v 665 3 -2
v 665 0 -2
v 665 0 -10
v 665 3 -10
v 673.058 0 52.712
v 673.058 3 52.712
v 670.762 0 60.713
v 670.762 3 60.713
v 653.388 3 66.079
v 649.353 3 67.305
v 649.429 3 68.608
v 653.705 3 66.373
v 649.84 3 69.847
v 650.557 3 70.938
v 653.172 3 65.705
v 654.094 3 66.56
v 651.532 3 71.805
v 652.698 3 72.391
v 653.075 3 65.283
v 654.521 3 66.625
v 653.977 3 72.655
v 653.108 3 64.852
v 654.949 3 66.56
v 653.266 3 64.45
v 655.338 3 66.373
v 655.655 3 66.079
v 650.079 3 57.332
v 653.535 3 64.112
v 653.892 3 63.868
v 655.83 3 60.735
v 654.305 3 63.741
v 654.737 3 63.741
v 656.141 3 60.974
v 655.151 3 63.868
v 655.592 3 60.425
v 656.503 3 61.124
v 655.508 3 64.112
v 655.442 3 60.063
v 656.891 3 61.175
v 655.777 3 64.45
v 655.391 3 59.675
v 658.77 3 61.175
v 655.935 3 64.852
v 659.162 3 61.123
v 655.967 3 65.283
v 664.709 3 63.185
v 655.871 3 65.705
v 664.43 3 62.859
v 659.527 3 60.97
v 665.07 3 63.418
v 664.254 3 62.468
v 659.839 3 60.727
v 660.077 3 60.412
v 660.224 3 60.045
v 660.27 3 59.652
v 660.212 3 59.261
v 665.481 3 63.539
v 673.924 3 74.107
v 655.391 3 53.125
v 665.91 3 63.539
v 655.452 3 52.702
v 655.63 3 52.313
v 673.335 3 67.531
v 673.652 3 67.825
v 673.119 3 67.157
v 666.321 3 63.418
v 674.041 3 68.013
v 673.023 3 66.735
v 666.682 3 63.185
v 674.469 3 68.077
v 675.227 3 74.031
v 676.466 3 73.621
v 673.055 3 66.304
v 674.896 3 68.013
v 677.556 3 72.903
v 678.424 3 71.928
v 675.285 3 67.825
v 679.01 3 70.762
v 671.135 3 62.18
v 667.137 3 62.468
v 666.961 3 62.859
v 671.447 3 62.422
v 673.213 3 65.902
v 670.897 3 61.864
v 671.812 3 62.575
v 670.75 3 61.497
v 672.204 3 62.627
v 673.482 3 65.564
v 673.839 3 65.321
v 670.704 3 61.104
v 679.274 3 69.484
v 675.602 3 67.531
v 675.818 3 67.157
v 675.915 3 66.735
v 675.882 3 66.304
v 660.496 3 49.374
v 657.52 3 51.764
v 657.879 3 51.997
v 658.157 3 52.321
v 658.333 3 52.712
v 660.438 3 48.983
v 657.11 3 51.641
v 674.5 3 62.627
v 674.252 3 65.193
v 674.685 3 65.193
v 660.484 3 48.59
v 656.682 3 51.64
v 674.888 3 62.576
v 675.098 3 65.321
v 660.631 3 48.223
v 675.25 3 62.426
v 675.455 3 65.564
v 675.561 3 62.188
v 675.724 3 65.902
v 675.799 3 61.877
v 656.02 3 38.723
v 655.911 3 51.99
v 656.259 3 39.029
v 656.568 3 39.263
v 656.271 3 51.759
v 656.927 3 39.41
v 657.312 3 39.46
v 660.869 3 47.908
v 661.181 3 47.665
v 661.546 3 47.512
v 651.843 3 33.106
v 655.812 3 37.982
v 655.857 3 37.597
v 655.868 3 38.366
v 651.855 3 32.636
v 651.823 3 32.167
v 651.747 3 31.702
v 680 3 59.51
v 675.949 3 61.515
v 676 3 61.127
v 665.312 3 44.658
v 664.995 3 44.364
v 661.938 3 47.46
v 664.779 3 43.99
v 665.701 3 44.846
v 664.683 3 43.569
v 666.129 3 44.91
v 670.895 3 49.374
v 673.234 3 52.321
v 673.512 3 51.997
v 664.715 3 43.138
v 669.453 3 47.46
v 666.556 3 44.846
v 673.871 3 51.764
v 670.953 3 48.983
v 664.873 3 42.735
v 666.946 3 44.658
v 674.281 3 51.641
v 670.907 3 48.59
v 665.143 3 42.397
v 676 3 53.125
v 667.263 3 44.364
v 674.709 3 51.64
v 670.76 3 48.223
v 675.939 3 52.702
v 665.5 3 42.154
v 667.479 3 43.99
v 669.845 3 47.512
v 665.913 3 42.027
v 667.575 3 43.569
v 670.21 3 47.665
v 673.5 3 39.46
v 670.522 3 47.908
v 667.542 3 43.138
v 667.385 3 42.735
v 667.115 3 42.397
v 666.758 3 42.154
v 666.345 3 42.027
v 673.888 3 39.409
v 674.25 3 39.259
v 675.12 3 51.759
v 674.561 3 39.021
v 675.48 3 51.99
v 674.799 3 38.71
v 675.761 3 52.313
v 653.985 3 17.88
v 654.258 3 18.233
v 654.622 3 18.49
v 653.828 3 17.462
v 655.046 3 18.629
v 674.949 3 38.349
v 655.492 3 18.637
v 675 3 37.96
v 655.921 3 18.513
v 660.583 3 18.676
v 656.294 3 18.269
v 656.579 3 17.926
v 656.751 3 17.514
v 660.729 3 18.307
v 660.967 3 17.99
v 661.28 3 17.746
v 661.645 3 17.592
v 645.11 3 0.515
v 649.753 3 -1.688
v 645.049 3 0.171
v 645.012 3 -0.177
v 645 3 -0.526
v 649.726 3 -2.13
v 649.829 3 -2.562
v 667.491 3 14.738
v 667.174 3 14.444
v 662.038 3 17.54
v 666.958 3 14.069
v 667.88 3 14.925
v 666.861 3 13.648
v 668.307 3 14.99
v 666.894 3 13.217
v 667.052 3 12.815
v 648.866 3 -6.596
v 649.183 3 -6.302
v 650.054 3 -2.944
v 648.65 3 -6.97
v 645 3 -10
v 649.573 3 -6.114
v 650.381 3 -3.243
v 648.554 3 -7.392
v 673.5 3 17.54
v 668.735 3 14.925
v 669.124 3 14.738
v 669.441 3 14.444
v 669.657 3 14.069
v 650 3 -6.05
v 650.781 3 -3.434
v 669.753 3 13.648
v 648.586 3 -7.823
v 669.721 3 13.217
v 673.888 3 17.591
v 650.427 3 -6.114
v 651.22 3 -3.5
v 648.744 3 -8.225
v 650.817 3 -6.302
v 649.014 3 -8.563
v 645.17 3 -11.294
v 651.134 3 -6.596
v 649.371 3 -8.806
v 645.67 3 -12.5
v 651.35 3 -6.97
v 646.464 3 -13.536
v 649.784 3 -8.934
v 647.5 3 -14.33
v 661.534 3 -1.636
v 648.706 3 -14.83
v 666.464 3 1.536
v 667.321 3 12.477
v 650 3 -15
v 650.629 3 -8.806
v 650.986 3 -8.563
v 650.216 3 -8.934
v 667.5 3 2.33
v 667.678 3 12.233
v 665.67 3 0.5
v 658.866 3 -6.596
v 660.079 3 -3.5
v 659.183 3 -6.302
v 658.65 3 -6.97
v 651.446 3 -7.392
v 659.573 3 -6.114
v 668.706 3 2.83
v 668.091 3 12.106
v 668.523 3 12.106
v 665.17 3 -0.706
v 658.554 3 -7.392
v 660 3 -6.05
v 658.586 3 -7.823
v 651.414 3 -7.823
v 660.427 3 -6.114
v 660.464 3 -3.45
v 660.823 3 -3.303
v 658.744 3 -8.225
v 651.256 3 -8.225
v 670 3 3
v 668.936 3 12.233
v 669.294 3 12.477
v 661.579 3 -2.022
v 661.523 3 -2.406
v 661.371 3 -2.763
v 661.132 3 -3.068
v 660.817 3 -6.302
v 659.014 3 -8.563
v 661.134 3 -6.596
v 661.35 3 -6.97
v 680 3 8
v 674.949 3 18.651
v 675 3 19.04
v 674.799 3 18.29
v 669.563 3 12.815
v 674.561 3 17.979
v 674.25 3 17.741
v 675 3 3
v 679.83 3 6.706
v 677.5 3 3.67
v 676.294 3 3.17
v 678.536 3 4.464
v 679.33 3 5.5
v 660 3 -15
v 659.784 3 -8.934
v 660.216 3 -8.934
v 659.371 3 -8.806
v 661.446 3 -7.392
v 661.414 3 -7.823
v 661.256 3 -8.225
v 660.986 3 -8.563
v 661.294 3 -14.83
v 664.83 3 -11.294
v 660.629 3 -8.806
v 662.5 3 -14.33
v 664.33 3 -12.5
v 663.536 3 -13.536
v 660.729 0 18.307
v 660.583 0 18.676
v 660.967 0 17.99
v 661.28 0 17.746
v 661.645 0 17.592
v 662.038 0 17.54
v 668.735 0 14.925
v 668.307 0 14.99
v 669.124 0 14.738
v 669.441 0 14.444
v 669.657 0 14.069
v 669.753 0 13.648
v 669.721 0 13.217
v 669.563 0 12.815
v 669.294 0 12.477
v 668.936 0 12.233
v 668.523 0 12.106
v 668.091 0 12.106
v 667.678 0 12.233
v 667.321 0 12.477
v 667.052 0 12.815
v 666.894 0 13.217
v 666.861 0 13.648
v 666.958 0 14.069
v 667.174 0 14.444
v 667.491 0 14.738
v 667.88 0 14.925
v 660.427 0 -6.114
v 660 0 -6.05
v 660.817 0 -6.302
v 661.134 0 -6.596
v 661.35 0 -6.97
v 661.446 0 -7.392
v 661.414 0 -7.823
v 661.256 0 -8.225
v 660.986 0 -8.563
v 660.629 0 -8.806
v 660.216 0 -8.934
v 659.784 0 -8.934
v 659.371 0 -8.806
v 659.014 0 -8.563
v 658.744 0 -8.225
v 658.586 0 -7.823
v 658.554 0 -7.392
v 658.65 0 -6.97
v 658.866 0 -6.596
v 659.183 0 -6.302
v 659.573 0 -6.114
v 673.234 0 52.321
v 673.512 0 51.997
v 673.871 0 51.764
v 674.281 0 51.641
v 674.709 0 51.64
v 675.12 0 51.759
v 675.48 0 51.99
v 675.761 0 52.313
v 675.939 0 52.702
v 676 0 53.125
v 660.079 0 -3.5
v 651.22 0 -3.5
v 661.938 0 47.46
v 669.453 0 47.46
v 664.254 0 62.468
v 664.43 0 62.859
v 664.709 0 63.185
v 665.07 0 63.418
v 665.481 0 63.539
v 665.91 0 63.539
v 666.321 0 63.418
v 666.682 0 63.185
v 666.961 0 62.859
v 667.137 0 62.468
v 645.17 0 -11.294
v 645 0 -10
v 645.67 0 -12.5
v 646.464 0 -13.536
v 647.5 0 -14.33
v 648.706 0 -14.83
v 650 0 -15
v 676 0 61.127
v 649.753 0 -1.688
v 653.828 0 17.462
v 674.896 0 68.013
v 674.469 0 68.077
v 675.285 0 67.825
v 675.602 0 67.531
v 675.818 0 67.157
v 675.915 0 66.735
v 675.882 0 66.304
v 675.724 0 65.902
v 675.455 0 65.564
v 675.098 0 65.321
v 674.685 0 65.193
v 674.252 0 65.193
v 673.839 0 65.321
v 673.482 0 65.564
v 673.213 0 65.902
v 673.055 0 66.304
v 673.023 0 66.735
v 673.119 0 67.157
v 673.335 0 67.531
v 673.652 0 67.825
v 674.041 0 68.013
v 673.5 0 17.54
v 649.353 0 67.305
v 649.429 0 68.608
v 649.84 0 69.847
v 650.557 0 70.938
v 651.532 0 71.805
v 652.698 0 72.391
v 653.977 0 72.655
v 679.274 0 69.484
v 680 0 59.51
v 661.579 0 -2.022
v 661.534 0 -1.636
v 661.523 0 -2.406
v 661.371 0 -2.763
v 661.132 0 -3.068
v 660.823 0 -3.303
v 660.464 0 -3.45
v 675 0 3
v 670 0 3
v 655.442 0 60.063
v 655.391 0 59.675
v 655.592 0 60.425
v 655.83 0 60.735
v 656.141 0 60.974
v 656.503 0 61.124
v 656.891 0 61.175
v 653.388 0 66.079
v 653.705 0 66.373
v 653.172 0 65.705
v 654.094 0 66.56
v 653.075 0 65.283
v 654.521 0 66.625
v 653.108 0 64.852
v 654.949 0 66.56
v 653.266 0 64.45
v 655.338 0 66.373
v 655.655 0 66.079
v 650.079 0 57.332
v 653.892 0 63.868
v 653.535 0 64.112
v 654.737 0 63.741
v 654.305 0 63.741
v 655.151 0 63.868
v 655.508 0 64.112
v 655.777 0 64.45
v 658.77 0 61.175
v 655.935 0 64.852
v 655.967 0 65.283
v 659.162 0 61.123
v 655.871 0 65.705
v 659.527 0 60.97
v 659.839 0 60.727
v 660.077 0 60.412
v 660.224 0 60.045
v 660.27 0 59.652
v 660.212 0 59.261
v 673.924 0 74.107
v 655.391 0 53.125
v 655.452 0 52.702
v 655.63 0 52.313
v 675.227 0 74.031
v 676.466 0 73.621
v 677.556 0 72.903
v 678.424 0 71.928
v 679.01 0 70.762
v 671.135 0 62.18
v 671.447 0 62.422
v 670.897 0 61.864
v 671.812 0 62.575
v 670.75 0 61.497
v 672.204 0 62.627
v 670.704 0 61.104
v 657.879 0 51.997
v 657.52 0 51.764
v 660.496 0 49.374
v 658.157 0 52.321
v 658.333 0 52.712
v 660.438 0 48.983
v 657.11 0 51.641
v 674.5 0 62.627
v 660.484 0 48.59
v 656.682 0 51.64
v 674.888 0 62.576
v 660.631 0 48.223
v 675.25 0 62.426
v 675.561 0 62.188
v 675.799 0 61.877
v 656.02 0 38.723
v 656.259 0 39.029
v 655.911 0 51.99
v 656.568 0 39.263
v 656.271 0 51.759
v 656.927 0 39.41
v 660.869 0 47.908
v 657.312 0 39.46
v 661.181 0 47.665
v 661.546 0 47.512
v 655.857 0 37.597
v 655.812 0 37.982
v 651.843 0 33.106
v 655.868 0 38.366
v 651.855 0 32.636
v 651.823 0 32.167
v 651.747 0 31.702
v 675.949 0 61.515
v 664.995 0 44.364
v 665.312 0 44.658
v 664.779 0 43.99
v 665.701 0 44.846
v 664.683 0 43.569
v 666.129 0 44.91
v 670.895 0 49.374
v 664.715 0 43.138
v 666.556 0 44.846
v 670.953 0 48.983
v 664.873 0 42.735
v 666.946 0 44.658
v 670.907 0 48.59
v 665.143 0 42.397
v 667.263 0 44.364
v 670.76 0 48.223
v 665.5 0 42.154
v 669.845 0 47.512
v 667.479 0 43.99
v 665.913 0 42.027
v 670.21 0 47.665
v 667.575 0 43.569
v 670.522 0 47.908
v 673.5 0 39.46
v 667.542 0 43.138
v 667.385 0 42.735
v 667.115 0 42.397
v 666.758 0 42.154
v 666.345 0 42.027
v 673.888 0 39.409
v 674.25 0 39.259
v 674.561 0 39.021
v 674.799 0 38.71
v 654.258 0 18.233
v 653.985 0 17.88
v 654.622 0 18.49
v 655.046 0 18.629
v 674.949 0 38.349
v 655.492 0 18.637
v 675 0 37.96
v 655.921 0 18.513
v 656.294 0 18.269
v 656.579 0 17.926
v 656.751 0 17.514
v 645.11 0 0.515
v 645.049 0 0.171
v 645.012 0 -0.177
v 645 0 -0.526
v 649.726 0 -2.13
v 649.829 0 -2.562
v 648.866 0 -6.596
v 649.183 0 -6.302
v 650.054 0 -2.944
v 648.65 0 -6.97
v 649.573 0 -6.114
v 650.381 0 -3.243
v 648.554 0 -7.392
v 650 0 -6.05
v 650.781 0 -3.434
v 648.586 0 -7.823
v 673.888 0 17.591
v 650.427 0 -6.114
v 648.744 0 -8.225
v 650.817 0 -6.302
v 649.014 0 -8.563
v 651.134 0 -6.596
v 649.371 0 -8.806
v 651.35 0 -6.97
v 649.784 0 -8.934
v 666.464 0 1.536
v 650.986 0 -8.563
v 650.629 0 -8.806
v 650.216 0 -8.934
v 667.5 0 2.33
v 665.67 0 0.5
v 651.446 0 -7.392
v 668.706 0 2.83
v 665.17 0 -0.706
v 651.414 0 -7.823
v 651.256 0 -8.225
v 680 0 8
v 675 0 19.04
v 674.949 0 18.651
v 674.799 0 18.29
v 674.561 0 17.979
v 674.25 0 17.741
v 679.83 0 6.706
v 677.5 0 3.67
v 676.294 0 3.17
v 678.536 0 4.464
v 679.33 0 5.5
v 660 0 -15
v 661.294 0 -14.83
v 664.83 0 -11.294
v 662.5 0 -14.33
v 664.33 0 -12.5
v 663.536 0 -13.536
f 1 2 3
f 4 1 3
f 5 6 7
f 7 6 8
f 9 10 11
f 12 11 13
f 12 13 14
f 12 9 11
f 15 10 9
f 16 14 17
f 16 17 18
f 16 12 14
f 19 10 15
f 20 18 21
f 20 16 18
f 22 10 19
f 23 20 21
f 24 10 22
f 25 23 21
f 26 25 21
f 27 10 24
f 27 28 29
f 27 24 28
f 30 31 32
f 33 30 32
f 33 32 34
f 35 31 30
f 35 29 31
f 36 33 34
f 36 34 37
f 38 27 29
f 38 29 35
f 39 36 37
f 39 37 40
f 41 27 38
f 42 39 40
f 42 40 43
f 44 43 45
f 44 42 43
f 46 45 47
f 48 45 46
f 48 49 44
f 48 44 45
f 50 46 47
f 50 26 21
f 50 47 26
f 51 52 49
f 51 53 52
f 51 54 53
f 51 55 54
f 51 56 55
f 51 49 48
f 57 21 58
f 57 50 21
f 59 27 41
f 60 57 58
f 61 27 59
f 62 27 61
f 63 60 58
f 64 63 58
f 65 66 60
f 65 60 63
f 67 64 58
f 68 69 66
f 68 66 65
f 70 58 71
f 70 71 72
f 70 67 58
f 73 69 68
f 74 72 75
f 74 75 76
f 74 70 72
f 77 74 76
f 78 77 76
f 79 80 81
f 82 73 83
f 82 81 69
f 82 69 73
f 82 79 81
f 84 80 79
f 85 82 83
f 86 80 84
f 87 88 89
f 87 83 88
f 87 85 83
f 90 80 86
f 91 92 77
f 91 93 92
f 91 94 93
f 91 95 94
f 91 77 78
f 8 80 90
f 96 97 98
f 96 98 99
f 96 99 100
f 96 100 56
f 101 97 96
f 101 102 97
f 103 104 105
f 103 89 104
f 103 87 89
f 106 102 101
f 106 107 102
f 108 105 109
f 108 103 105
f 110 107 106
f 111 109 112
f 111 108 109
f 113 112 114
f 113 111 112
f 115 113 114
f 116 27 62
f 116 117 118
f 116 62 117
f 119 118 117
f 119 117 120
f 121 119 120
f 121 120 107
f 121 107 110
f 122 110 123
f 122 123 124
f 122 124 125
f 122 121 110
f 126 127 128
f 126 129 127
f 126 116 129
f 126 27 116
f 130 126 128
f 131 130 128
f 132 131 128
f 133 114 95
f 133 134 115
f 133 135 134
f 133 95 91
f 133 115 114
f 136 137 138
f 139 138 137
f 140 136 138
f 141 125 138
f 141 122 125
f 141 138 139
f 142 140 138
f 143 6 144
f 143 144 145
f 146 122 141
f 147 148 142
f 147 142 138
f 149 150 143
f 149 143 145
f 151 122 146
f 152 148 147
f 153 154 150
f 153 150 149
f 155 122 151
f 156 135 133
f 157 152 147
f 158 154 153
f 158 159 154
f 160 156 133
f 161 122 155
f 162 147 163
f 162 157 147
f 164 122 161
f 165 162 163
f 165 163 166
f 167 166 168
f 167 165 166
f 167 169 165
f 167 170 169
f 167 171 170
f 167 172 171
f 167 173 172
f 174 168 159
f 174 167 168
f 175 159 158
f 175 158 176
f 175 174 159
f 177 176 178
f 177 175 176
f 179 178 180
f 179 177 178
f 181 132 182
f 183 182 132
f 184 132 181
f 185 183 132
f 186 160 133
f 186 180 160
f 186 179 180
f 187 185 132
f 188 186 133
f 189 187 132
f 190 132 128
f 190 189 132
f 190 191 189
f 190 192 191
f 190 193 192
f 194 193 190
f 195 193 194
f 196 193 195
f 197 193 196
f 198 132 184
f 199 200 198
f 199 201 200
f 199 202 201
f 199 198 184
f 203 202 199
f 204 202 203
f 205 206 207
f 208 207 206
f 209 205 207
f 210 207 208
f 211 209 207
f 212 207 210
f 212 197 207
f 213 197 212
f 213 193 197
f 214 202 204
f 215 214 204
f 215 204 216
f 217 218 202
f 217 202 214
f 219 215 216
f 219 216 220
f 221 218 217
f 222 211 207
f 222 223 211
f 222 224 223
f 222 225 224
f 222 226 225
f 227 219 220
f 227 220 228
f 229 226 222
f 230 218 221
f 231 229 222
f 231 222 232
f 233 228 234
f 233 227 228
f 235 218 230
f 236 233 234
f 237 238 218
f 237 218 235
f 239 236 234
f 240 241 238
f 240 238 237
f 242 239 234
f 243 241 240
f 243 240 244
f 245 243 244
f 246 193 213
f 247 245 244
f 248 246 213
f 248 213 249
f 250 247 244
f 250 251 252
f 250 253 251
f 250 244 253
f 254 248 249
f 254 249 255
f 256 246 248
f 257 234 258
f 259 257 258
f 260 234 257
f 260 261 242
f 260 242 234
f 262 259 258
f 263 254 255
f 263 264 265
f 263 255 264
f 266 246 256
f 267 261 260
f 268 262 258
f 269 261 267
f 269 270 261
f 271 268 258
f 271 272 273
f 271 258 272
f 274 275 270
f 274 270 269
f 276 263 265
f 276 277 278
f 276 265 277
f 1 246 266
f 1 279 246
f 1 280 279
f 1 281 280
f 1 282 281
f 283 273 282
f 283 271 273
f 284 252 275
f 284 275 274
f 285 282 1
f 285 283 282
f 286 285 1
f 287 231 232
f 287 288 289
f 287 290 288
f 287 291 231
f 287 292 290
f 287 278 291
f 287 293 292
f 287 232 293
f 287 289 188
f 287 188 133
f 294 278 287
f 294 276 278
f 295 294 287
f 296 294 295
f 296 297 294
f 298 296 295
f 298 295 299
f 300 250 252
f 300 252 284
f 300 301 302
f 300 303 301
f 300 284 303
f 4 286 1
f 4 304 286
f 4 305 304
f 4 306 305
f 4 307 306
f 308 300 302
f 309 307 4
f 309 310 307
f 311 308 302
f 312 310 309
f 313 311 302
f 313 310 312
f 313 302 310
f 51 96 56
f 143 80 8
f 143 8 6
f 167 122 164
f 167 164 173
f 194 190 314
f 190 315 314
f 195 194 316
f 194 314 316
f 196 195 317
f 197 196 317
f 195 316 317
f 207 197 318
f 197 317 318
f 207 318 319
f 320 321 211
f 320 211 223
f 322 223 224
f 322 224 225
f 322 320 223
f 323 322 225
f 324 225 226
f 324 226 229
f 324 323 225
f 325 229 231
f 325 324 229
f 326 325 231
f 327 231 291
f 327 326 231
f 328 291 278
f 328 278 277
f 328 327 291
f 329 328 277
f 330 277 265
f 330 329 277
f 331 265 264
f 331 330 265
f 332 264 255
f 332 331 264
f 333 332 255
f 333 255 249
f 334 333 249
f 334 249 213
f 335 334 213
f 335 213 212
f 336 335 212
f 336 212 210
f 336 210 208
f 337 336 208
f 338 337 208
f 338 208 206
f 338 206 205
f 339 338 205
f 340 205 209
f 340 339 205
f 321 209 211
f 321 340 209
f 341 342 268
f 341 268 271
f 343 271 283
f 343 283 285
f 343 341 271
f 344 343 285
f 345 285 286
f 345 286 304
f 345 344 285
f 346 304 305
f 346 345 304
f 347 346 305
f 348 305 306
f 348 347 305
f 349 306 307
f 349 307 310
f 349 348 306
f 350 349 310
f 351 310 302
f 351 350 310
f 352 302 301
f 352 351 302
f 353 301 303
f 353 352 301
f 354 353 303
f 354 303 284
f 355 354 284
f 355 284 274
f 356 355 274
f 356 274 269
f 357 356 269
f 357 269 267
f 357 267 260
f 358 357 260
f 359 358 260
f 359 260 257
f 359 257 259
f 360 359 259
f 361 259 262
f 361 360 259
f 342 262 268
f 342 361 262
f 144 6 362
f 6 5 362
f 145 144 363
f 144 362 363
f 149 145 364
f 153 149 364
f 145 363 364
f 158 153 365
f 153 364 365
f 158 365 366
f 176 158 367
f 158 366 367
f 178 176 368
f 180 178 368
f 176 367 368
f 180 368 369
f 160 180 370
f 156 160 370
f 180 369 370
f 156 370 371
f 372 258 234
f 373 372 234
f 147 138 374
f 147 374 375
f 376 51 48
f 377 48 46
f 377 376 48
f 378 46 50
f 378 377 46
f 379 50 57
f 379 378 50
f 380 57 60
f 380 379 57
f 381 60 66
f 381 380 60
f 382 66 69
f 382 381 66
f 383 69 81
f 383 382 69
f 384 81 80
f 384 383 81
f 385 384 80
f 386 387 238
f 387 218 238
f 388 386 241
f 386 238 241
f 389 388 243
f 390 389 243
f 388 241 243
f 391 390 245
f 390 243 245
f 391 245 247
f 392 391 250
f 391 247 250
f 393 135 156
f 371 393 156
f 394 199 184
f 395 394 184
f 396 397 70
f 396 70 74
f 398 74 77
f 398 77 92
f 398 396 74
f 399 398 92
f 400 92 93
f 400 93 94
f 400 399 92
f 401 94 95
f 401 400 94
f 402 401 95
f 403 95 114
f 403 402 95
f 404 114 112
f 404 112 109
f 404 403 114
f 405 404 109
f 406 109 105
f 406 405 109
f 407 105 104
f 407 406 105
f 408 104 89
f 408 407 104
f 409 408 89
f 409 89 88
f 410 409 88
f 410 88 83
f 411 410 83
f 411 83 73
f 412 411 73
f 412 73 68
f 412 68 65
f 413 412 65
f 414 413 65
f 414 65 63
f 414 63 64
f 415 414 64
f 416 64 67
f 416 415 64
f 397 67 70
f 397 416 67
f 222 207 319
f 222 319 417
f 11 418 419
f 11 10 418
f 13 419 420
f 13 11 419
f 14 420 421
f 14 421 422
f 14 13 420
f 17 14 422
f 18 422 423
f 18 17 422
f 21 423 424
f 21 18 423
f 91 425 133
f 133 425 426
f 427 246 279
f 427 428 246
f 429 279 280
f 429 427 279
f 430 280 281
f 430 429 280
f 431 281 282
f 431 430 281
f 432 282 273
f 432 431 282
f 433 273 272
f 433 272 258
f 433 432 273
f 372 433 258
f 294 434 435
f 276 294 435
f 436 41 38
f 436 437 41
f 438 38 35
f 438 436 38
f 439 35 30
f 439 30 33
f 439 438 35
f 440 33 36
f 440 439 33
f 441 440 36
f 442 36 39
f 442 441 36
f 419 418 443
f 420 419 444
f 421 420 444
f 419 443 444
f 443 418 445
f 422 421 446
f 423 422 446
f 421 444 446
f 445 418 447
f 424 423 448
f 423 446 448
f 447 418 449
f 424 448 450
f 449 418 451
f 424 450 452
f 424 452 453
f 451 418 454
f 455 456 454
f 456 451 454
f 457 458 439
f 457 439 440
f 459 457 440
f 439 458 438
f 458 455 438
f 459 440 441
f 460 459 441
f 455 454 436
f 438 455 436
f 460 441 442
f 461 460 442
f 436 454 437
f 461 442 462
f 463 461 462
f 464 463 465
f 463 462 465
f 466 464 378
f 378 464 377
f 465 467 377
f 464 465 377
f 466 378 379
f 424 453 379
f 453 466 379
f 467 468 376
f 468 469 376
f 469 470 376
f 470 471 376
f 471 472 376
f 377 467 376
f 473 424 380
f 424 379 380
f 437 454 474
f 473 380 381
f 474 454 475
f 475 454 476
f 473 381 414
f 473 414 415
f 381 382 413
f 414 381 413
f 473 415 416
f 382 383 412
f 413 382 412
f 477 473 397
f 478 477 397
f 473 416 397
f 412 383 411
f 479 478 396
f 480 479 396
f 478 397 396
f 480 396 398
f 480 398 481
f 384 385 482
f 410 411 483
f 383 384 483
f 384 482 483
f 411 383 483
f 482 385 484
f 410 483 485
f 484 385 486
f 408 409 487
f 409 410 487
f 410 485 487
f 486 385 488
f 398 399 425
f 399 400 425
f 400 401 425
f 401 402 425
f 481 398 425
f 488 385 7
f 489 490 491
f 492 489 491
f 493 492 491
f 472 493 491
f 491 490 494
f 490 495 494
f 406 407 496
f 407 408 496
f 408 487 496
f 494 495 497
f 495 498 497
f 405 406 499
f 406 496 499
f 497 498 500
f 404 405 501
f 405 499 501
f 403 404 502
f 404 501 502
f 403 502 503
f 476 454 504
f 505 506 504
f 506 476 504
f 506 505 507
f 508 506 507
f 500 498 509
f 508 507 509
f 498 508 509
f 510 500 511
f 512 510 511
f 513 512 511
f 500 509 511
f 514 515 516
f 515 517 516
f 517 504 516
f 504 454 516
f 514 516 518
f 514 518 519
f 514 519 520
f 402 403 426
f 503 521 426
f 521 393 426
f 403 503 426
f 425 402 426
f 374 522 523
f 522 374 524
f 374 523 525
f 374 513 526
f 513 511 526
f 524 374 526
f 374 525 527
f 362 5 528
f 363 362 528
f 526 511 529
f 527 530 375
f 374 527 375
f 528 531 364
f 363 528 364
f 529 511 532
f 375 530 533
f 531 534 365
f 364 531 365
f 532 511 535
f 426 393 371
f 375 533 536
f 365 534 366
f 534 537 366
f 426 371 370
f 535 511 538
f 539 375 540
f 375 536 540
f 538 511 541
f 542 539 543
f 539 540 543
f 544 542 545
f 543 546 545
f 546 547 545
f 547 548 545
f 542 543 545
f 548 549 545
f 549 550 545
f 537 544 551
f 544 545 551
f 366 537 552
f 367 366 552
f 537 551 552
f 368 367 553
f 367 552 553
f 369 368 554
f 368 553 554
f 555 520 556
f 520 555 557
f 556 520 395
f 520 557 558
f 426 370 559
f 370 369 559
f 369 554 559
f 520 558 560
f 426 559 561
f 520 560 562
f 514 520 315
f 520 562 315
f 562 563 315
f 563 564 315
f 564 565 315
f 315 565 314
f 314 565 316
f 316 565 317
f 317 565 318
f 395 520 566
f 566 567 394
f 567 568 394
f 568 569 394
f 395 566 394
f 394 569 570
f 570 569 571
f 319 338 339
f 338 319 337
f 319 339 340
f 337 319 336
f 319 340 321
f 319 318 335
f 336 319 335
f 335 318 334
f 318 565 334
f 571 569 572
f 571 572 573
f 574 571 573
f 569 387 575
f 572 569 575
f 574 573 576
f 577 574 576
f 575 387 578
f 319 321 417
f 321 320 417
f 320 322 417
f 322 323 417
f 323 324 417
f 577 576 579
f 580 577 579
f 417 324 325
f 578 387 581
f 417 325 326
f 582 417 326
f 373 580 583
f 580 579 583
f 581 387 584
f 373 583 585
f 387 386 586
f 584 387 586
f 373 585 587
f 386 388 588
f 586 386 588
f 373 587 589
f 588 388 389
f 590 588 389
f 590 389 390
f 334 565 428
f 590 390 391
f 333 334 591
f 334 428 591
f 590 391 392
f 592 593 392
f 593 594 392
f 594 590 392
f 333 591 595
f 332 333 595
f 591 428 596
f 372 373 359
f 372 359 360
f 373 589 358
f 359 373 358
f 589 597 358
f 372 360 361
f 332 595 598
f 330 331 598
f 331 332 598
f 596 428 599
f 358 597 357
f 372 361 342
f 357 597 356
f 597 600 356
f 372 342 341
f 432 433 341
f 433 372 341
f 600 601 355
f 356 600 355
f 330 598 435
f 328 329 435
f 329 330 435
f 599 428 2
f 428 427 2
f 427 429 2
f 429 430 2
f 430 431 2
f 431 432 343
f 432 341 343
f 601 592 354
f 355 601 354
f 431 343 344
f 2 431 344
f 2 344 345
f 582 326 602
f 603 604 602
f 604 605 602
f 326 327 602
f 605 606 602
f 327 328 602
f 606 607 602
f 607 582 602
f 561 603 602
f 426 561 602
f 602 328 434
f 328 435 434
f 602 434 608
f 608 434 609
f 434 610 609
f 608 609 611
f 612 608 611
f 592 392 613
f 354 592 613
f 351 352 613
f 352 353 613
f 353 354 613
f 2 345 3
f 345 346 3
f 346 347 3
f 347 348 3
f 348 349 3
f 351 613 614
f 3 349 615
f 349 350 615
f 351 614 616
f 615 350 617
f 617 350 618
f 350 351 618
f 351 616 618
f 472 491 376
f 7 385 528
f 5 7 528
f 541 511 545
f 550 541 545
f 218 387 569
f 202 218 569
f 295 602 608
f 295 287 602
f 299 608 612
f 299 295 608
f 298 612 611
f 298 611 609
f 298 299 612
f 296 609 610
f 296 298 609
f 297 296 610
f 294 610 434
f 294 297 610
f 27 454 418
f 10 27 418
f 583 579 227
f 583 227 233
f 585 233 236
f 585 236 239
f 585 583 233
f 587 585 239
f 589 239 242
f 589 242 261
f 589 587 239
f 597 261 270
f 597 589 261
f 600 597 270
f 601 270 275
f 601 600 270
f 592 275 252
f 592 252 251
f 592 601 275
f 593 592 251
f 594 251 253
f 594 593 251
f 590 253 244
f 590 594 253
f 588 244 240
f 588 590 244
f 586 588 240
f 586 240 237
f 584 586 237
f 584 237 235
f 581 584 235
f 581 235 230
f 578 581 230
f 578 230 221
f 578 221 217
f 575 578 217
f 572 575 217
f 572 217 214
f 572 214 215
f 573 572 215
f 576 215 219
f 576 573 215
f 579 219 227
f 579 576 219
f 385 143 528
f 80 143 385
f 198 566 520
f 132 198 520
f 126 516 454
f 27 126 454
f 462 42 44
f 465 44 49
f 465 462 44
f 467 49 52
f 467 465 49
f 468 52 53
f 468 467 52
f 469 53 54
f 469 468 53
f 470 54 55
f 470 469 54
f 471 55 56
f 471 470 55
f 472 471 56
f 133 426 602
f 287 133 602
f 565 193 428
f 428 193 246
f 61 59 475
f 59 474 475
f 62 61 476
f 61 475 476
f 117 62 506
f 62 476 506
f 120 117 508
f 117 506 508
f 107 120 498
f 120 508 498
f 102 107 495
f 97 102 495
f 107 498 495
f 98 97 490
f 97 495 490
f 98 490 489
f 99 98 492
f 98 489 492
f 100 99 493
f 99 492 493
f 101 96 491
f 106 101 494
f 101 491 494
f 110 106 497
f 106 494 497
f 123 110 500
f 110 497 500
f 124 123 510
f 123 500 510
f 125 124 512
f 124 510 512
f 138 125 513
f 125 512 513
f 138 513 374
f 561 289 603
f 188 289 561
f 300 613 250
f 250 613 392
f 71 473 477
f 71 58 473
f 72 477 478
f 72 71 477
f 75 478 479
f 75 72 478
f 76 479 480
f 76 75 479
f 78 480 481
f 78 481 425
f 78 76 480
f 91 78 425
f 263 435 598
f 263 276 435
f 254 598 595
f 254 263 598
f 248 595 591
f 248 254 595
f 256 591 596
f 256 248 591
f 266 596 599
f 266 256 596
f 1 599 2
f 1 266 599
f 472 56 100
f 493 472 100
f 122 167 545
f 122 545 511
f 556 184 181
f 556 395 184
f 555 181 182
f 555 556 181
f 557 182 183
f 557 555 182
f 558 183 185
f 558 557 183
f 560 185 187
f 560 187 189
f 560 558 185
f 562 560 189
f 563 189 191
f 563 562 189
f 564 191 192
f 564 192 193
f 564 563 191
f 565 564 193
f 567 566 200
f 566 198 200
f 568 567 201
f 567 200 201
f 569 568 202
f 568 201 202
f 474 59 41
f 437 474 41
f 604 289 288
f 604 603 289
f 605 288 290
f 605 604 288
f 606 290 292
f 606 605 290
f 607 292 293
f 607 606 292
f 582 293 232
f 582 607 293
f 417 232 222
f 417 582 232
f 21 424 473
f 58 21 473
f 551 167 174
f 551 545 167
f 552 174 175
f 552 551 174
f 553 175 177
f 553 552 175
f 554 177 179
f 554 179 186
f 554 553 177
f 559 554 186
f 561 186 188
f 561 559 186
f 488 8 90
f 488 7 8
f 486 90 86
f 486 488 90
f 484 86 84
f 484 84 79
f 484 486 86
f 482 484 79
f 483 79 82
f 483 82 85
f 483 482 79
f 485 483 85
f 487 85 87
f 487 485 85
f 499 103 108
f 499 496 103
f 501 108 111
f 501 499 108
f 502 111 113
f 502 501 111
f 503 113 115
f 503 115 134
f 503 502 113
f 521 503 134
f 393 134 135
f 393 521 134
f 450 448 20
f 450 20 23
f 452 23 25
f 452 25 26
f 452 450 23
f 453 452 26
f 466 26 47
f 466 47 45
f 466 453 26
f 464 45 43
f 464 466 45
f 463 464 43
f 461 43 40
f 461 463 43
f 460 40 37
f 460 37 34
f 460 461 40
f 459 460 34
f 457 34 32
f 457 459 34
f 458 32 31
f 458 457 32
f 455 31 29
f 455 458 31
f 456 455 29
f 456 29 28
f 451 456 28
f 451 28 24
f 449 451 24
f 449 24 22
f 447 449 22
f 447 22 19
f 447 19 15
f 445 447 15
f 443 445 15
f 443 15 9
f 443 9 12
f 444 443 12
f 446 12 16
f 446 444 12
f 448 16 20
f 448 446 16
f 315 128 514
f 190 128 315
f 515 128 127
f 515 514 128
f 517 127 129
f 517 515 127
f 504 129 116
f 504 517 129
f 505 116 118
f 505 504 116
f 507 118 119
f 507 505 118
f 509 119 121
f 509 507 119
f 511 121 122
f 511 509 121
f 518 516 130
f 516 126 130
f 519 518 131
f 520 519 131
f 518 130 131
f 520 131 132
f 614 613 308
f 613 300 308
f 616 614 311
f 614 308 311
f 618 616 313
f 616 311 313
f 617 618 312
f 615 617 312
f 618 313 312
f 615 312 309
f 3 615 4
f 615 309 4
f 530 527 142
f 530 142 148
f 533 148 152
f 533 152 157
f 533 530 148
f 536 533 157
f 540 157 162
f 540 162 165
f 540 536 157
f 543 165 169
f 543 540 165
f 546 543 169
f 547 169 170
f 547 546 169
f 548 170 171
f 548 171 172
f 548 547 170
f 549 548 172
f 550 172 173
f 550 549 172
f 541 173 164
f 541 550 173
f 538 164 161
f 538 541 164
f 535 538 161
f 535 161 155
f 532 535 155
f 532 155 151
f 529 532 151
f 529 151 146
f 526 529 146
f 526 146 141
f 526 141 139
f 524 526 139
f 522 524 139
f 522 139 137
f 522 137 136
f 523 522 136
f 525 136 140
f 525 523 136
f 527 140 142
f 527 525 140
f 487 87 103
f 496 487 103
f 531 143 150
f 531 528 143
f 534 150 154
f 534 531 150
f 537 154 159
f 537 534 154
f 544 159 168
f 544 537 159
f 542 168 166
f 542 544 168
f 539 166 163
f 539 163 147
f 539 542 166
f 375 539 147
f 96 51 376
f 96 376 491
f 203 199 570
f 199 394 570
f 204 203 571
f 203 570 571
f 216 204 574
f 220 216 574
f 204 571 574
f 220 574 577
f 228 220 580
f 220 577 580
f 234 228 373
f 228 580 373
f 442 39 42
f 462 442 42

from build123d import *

# Parameters (mm, degrees)
SKETCH_1_R          = 1.45
EXTRUDE_1_DEPTH     = 3
FILLET_1_R          = 5
CUT_EXTRUDE_1_DEPTH = 685.034246793
FILLET_2_R          = 1.5


with BuildPart() as part:
    # 草图1 → 凸台-拉伸1 (new body)
    with BuildSketch(Plane(origin=(0, 0, 0), x_dir=(1, 0, 0), z_dir=(0, 1, 0))):
        Polygon((650.079202112, -57.331500941), (648.989953088, -72.291899885), (678.910750976, -74.470397934), (680, -59.50999899), (680, -3), (665, -3), (665, 15), (645, 15), (645, 0), (651.894617153, -32.397502701), align=None)
        with Locations(Location((660, 7.5, 0), (0, 0, 270))):
            Circle(SKETCH_1_R, mode=Mode.SUBTRACT)
        with Locations(Location((650, 7.5, 0), (0, 0, 270))):
            Circle(SKETCH_1_R, mode=Mode.SUBTRACT)
        with Locations(Location((654.521377248, -65.174783421, 0), (0, 0, 270))):
            Circle(SKETCH_1_R, mode=Mode.SUBTRACT)
        with Locations(Location((674.46857584, -66.627115454, 0), (0, 0, 270))):
            Circle(SKETCH_1_R, mode=Mode.SUBTRACT)
        with Locations(Location((666.12885008, -43.460351022, 0), (0, 0, 270))):
            Circle(SKETCH_1_R, mode=Mode.SUBTRACT)
        with Locations(Location((668.307348129, -13.539553134, 0), (0, 0, 270))):
            Circle(SKETCH_1_R, mode=Mode.SUBTRACT)
    extrude(amount=EXTRUDE_1_DEPTH)

    # 圆角1
    fillet_1_edges = [part.edges().sort_by_distance(p)[0] for p in [
        (678.910750976, 1.5, 74.470397934),
        (648.989953088, 1.5, 72.291899885),
        (651.894617153, 1.5, 32.397502701),
        (645, 1.5, 0),
        (645, 1.5, -15),
        (665, 1.5, -15),
        (665, 1.5, 3),
        (680, 1.5, 3),
    ]]
    fillet(fillet_1_edges, radius=FILLET_1_R)

    # 草图2 → 切除-拉伸1 (cut, through all)
    with BuildSketch(Plane(origin=(0, 3, 0), x_dir=(1, 0, 0), z_dir=(0, 1, 0))):
        Polygon((649.367123648, 3.5), (655.178416972, -23.807011685), (662, 3.5), align=None)
        Polygon((660.867017044, -17.539553134), (675, -17.539553134), (675, -39.460351022), (655.390967722, -39.460351022), align=None)
        Polygon((659.946903123, -47.460351022), (671.444064599, -47.460351022), (665.695483861, -67.49232755), align=None)
        Polygon((655.390967722, -42.460351022), (655.390967722, -61.174783421), (660.76145253, -61.174783421), align=None)
        Polygon((676, -42.460351022), (670.212739147, -62.627115454), (676, -62.627115454), align=None)
    extrude(amount=-CUT_EXTRUDE_1_DEPTH, mode=Mode.SUBTRACT)

    # 圆角2
    fillet_2_edges = [part.edges().sort_by_distance(p)[0] for p in [
        (655.390967722, 1.5, 39.460351022),
        (660.867017044, 1.5, 17.539553134),
        (675, 1.5, 17.539553134),
        (675, 1.5, 39.460351022),
        (665.695483861, 1.5, 67.49232755),
        (659.946903123, 1.5, 47.460351022),
        (671.444064599, 1.5, 47.460351022),
        (676, 1.5, 42.460351022),
        (676, 1.5, 62.627115454),
        (670.212739147, 1.5, 62.627115454),
        (655.390967722, 1.5, 42.460351022),
        (660.76145253, 1.5, 61.174783421),
        (655.390967722, 1.5, 61.174783421),
        (649.367123648, 1.5, -3.5),
        (662, 1.5, -3.5),
        (655.178416972, 1.5, 23.807011685),
        (680, 1.5, 59.50999899),
    ]]
    fillet(fillet_2_edges, radius=FILLET_2_R)


solid = part.part
